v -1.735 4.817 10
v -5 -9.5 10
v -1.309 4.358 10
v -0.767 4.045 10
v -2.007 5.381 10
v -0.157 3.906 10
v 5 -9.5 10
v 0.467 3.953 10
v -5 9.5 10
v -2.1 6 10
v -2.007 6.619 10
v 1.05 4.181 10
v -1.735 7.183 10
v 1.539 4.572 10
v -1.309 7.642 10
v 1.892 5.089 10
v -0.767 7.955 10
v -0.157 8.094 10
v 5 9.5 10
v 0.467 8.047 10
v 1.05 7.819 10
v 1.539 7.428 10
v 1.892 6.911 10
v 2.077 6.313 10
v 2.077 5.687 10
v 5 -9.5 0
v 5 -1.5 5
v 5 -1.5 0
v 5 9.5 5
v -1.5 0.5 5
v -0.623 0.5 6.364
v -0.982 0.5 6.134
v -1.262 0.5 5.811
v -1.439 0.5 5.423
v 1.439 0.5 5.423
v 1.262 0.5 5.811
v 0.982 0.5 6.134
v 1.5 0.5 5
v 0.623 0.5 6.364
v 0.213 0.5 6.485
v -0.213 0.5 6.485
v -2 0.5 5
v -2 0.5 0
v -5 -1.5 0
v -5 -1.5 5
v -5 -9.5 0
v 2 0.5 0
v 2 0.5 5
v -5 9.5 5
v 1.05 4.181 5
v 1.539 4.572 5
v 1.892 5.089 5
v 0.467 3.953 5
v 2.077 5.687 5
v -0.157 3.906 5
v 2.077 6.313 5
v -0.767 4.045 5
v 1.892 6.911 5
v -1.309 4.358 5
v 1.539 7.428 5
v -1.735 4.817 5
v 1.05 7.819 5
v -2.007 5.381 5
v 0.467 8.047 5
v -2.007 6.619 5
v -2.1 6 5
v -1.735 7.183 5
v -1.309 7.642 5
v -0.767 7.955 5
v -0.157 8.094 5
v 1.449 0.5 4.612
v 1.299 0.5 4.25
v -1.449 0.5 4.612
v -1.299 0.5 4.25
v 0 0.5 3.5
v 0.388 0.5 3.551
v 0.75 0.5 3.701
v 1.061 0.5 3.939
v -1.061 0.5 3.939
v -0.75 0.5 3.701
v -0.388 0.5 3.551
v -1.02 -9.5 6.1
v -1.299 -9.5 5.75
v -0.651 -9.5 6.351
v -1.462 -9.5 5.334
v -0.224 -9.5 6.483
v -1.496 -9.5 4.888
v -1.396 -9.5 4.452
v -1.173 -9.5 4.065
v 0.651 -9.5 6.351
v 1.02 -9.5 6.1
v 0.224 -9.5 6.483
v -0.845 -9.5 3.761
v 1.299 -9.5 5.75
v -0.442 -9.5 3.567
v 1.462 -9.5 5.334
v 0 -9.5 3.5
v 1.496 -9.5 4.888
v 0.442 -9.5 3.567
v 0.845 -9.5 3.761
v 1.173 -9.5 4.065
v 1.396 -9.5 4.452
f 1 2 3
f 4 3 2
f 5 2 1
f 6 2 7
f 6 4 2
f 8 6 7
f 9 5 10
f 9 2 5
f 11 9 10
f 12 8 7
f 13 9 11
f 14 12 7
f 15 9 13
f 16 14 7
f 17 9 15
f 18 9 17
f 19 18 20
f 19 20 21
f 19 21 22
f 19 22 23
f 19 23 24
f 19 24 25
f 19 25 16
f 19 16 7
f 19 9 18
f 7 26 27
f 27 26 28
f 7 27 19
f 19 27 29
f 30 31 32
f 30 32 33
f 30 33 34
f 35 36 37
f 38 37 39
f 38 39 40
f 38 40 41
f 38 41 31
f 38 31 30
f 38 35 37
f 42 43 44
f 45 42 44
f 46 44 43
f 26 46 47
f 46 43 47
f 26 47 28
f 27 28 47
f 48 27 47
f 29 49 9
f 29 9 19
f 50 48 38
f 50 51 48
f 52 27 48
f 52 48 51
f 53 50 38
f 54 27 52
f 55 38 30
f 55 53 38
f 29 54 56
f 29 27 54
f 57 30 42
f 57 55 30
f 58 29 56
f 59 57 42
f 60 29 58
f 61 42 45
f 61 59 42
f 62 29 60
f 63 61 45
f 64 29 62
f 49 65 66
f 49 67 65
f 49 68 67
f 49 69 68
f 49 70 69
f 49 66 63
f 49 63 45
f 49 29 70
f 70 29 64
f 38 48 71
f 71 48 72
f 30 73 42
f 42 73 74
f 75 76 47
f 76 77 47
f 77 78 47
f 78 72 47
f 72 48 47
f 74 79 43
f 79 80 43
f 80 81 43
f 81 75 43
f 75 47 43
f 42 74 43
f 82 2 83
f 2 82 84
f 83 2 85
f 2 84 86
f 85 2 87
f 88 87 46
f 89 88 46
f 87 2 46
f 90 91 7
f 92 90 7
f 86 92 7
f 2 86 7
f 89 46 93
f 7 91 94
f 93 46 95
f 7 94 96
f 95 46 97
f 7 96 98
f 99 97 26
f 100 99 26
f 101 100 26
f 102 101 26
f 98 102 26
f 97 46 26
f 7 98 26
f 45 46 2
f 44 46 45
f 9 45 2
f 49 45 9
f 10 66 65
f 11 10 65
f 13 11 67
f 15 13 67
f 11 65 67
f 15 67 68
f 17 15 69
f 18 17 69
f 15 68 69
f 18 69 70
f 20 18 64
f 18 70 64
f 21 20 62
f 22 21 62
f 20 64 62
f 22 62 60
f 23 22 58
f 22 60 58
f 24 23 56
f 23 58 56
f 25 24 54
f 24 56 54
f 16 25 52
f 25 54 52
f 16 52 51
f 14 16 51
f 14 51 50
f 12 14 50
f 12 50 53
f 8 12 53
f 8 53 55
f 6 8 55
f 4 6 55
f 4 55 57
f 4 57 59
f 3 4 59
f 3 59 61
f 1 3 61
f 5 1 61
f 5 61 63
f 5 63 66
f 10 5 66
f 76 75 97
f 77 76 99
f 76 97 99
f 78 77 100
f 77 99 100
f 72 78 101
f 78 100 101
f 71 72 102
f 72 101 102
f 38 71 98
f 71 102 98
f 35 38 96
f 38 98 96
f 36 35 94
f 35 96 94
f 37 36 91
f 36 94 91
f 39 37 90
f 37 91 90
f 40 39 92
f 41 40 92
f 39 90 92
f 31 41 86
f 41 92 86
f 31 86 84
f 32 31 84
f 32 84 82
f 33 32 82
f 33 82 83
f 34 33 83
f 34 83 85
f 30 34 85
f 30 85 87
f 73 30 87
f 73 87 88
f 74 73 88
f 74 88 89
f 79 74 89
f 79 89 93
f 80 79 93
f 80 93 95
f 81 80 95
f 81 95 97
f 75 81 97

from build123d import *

# Parameters (mm, degrees)
SKETCH_1_W          = 10
SKETCH_1_H          = 19
EXTRUDE_1_DEPTH     = 10
SKETCH_3_R          = 2.1
CUT_EXTRUDE_2_DEPTH = 15.671400751
CUT_EXTRUDE_4_DEPTH = 5
SKETCH_2_R          = 1.5
CUT_EXTRUDE_1_DEPTH = 10


with BuildPart() as part:
    # 草图1 → 凸台-拉伸1 (new body)
    with BuildSketch(Plane.XY):
        Rectangle(SKETCH_1_W, SKETCH_1_H)
    extrude(amount=EXTRUDE_1_DEPTH)

    # 草图3 → 切除-拉伸2 (cut, through all)
    with BuildSketch(Plane(origin=(0, 0, 0), x_dir=(-1, 0, 0), z_dir=(0, 0, -1))):
        with Locations((0, 6)):
            Circle(SKETCH_3_R)
    extrude(amount=-CUT_EXTRUDE_2_DEPTH, mode=Mode.SUBTRACT)

    # 草图6 → 切除-拉伸4 (cut)
    with BuildSketch(Plane(origin=(0, 0, 0), x_dir=(-1, 0, 0), z_dir=(0, 0, -1))):
        Polygon((5, 9.5), (-5, 9.5), (-5, -1.5), (-2, 0.5), (2, 0.5), (5, -1.5), align=None)
    extrude(amount=-CUT_EXTRUDE_4_DEPTH, mode=Mode.SUBTRACT)

    # 草图2 → 切除-拉伸1 (cut)
    with BuildSketch(Plane.XZ.offset(9.5)):
        with Locations(Location((0, 5, 0), (0, 0, 270))):
            Circle(SKETCH_2_R)
    extrude(amount=-CUT_EXTRUDE_1_DEPTH, mode=Mode.SUBTRACT)


solid = part.part
